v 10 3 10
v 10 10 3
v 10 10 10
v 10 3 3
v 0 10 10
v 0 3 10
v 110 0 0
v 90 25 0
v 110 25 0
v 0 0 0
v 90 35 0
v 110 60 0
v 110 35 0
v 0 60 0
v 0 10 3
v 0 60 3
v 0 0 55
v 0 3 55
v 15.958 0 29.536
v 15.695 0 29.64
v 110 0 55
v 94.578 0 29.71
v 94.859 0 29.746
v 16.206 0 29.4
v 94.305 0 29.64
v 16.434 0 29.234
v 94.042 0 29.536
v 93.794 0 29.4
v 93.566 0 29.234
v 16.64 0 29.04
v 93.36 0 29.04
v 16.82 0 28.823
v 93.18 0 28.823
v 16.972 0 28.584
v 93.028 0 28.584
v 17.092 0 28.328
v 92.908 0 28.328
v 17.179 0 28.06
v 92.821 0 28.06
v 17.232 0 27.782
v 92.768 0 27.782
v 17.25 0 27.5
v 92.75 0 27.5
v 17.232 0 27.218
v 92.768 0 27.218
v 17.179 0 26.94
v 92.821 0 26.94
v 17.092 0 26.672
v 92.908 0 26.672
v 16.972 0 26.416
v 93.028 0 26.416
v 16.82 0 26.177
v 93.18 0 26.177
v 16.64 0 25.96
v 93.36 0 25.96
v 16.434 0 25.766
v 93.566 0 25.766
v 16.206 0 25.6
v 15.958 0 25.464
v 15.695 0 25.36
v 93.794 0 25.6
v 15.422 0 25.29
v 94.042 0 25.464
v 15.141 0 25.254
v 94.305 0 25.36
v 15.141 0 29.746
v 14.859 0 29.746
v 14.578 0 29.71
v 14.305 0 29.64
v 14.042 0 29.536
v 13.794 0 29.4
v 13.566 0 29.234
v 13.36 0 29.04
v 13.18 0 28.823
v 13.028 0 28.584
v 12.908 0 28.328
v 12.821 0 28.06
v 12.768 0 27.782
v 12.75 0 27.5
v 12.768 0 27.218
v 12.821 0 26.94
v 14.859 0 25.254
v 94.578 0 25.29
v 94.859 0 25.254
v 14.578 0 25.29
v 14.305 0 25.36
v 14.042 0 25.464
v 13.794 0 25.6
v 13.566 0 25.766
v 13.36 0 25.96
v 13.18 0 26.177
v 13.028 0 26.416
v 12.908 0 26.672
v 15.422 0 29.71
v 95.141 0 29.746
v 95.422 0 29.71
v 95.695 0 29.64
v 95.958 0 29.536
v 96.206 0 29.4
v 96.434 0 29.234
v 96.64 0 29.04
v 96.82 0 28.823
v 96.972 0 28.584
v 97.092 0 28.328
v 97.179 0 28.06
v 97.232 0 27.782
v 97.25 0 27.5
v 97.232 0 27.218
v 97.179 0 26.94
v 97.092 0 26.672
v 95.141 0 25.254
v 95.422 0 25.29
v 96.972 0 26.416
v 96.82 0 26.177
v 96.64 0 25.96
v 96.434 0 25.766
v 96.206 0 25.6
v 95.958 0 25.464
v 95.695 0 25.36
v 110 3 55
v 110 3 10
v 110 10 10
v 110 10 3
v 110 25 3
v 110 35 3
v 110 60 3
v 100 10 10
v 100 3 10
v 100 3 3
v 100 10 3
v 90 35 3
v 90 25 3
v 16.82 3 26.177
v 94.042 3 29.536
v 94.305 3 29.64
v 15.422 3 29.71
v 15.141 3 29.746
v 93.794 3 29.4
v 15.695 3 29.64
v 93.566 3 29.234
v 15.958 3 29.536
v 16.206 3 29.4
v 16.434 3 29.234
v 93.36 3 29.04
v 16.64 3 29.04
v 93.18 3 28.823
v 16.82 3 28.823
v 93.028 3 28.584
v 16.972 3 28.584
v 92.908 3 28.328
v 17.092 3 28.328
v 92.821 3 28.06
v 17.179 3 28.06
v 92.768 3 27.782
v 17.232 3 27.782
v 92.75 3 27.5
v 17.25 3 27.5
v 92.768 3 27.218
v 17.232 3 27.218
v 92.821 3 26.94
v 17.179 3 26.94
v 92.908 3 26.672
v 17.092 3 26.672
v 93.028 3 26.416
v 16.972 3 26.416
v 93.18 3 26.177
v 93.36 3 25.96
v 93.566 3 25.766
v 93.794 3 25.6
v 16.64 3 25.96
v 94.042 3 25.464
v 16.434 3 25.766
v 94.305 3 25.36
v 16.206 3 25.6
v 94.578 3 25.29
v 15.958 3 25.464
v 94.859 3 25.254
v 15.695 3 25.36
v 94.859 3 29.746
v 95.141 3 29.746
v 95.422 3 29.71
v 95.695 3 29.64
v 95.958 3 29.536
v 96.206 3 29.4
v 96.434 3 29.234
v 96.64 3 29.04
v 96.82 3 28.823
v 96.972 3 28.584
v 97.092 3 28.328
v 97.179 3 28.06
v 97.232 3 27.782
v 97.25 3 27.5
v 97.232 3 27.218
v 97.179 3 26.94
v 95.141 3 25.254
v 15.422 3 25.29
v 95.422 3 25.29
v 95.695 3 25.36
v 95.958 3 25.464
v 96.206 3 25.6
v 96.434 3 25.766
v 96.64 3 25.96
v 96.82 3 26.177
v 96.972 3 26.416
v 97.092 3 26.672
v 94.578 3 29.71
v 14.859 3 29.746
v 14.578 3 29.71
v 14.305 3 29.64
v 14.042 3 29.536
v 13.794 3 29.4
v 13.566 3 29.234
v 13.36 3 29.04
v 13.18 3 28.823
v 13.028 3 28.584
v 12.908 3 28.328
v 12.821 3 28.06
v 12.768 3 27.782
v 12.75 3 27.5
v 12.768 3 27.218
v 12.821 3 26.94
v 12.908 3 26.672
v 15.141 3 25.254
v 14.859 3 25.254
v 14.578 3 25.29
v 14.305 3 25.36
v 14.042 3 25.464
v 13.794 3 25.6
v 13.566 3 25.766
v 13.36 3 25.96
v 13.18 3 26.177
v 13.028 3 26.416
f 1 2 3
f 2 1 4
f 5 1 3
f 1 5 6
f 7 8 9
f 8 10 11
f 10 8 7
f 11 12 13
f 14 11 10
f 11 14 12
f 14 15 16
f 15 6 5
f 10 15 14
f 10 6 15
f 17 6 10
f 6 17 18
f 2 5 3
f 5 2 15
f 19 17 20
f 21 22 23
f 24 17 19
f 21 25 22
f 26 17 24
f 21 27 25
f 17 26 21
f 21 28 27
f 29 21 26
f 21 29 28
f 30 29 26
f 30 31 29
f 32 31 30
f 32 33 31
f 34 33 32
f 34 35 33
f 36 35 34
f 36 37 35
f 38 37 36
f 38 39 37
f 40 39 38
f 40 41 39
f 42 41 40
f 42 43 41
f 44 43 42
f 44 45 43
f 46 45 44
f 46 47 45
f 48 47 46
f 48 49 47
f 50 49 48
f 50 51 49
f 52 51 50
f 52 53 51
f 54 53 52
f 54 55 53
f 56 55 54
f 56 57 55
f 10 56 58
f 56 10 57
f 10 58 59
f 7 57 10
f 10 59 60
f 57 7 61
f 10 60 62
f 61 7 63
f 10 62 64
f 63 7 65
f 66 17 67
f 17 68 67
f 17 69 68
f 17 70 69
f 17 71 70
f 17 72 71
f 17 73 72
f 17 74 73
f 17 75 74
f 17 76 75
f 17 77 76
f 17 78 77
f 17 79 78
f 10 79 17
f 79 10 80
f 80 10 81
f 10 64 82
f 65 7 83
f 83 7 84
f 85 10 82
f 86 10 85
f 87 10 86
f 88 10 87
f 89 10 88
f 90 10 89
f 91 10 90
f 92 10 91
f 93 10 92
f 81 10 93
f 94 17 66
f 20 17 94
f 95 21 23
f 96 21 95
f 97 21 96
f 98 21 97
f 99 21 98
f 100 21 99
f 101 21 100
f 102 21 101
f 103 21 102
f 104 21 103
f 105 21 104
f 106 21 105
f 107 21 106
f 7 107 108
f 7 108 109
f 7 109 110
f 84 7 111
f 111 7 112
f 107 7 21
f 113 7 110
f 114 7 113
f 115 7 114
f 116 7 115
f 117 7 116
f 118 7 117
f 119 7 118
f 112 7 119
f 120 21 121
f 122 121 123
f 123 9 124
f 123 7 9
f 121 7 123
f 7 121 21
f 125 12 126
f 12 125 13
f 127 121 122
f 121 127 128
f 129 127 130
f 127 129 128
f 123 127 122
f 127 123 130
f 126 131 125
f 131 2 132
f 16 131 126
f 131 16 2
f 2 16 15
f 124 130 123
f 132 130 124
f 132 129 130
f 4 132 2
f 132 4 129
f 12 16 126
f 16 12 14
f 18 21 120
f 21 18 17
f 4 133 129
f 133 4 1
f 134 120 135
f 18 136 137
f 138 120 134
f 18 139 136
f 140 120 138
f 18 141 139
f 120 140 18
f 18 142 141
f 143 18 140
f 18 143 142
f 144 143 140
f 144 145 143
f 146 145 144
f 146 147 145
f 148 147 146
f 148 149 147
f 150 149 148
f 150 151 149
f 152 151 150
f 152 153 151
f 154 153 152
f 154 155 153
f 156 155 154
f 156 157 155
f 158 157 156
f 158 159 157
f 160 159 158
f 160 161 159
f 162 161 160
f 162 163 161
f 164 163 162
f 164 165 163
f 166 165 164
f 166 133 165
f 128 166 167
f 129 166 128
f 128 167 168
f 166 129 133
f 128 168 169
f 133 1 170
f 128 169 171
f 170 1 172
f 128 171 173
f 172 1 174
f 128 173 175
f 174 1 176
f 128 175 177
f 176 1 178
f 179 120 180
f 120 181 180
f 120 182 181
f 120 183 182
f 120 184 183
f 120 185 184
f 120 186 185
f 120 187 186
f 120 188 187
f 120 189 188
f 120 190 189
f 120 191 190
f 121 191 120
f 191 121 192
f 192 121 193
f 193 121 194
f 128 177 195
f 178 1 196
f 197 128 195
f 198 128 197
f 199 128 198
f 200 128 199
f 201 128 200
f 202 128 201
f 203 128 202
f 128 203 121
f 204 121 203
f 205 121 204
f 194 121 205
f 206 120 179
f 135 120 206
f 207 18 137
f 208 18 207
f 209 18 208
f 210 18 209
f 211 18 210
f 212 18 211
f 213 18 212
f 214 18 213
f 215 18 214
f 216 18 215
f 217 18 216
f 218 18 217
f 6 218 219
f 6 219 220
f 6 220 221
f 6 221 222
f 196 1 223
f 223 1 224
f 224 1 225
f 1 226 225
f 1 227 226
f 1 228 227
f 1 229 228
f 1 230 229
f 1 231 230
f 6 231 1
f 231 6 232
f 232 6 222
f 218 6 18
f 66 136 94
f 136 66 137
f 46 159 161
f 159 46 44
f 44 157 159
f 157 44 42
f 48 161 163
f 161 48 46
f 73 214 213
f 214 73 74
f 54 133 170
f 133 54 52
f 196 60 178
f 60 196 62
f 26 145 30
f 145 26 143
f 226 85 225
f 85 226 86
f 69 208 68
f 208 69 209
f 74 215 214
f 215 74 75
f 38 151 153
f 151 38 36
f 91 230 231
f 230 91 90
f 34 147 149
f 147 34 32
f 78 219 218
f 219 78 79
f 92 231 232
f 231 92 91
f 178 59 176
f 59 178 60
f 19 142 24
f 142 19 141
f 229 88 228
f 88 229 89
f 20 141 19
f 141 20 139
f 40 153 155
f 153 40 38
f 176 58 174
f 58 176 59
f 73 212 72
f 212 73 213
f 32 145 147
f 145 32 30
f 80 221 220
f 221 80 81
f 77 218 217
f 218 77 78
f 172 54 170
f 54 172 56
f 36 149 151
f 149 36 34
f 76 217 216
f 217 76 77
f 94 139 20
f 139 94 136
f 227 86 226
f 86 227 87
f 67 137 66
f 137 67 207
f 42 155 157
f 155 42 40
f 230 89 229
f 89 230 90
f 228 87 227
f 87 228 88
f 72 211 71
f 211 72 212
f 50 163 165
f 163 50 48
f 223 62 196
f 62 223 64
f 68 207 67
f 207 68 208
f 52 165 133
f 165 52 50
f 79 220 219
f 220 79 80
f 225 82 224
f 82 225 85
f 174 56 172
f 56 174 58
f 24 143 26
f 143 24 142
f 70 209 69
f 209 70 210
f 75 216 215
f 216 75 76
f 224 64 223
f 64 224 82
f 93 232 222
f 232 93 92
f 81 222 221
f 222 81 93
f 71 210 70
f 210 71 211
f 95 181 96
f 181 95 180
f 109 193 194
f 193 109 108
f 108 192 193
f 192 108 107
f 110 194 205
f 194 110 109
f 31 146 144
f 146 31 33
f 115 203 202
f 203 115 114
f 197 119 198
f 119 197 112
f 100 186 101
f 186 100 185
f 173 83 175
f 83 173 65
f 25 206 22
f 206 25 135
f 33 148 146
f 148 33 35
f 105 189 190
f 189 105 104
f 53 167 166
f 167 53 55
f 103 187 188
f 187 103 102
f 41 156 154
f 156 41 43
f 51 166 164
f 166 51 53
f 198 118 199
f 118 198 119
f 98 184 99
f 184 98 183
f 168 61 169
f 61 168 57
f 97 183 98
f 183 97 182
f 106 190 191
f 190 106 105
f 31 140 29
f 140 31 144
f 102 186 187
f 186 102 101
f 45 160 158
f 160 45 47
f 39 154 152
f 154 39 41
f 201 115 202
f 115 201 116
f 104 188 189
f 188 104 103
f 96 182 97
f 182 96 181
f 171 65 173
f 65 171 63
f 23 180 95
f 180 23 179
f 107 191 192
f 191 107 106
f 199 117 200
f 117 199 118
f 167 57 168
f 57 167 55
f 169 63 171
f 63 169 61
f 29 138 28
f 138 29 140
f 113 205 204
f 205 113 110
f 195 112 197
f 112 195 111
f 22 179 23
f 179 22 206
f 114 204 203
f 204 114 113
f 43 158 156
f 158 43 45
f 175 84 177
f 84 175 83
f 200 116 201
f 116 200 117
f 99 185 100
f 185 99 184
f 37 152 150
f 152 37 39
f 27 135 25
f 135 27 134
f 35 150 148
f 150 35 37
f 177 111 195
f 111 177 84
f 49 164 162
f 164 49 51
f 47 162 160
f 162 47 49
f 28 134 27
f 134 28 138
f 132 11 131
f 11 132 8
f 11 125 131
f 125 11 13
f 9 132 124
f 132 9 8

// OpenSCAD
/*
 * OpenReef Peristaltic Pump L-Bracket Mount
 *
 * Parametric mounting bracket for peristaltic pumps
 * Features:
 * - L-shaped bracket for vertical pump mounting
 * - Adjustable dimensions for different pump sizes
 * - Mounting holes for pump and enclosure
 * - Cable management slot
 *
 * License: MIT
 * Based on: OpenReef project (openreef.org)
 */

// ============ PARAMETERS (Adjust these) ============

// Pump mounting holes
pump_mounting_hole_spacing = 80;   // Distance between pump mounting holes (mm)
pump_mounting_hole_diameter = 4.5; // M4 screws (mm)
pump_width = 50;                   // Width of pump body (mm)
pump_length = 100;                 // Length of pump body (mm)
pump_height = 45;                  // Height of pump (mm)

// Bracket dimensions
bracket_base_width = 60;           // Width of base plate (mm)
bracket_base_length = 110;         // Length of base plate (mm)
bracket_vertical_height = 55;      // Height of vertical plate (mm)
bracket_thickness = 3;             // Thickness of bracket material (mm)

// Enclosure mounting holes
enclosure_mounting_holes = 4;      // Number of holes to mount to enclosure
enclosure_hole_diameter = 3.5;     // M3 screws (mm)
enclosure_hole_spacing_x = 50;     // Spacing between holes horizontally (mm)
enclosure_hole_spacing_y = 100;    // Spacing between holes vertically (mm)

// Cable management
cable_slot_width = 10;             // Width of cable slot (mm)
cable_slot_height = 5;             // Height of cable slot (mm)

// Reinforcement
add_gusset = true;                 // Add triangular gusset for strength
gusset_height = 30;                // Height of gusset triangle (mm)

// Print settings
$fn = 50;                          // Resolution

// ============ CALCULATIONS ============

total_width = max(bracket_base_width, pump_width + 10);
total_length = max(bracket_base_length, pump_length + 10);

// ============ MAIN MODEL ============

module pump_mount_bracket() {
    difference() {
        union() {
            // Base plate (horizontal)
            cube([total_length, total_width, bracket_thickness]);

            // Vertical plate
            translate([0, 0, 0])
                cube([total_length, bracket_thickness, bracket_vertical_height]);

            // Gusset reinforcement
            if (add_gusset) {
                translate([total_length/2 - gusset_height/2, bracket_thickness, 0])
                    rotate([90, 0, 0])
                        linear_extrude(height=bracket_thickness)
                            polygon(points=[
                                [0, 0],
                                [gusset_height, 0],
                                [gusset_height/2, gusset_height]
                            ]);
            }

            // Corner reinforcement blocks
            for (x = [0, total_length - 10]) {
                translate([x, 0, 0])
                    cube([10, 10, 10]);
            }
        }

        // Pump mounting holes (vertical plate)
        pump_hole_offset_z = bracket_vertical_height / 2;
        pump_hole_offset_x1 = (total_length - pump_mounting_hole_spacing) / 2;
        pump_hole_offset_x2 = pump_hole_offset_x1 + pump_mounting_hole_spacing;

        translate([pump_hole_offset_x1, -1, pump_hole_offset_z])
            rotate([-90, 0, 0])
                cylinder(h=bracket_thickness + 2, d=pump_mounting_hole_diameter);

        translate([pump_hole_offset_x2, -1, pump_hole_offset_z])
            rotate([-90, 0, 0])
                cylinder(h=bracket_thickness + 2, d=pump_mounting_hole_diameter);

        // Countersink for pump mounting holes (optional)
        translate([pump_hole_offset_x1, bracket_thickness, pump_hole_offset_z])
            rotate([-90, 0, 0])
                cylinder(h=2, d1=pump_mounting_hole_diameter, d2=pump_mounting_hole_diameter + 2);

        translate([pump_hole_offset_x2, bracket_thickness, pump_hole_offset_z])
            rotate([-90, 0, 0])
                cylinder(h=2, d1=pump_mounting_hole_diameter, d2=pump_mounting_hole_diameter + 2);

        // Enclosure mounting holes (base plate)
        enclosure_hole_x1 = (total_length - enclosure_hole_spacing_x) / 2;
        enclosure_hole_x2 = enclosure_hole_x1 + enclosure_hole_spacing_x;
        enclosure_hole_y1 = (total_width - enclosure_hole_spacing_y) / 2;
        enclosure_hole_y2 = enclosure_hole_y1 + enclosure_hole_spacing_y;

        for (x = [enclosure_hole_x1, enclosure_hole_x2]) {
            for (y = [enclosure_hole_y1, enclosure_hole_y2]) {
                translate([x, y, -1])
                    cylinder(h=bracket_thickness + 2, d=enclosure_hole_diameter);

                // Countersink for flush mounting
                translate([x, y, bracket_thickness - 1.5])
                    cylinder(h=2, d1=enclosure_hole_diameter, d2=enclosure_hole_diameter + 3);
            }
        }

        // Cable management slot
        translate([total_length - 20, total_width/2 - cable_slot_width/2, bracket_thickness - cable_slot_height])
            cube([20, cable_slot_width, cable_slot_height + 1]);

        // Cable pass-through hole
        translate([total_length - 10, total_width/2, -1])
            cylinder(h=bracket_thickness + 2, d=8);
    }
}

// ============ RENDER ============

pump_mount_bracket();

// ============ PRINT INSTRUCTIONS ============

/*
 * PRINTING TIPS:
 *
 * 1. Orientation: Print with base plate flat on bed
 * 2. Layer height: 0.2mm
 * 3. Infill: 40% (needs strength)
 * 4. Supports: None needed with this orientation
 * 5. Material: PETG (strong, heat resistant) or PLA
 * 6. Perimeters: 4 perimeters for extra strength
 * 7. First layer: Critical - ensure good adhesion
 *
 * ASSEMBLY:
 *
 * 1. Mount bracket to enclosure using 4× M3 screws
 * 2. Verify bracket is level and secure
 * 3. Mount pump to bracket using 2× M4 screws
 * 4. Route cables through cable slot and pass-through hole
 * 5. Connect pump to motor driver
 *
 * CUSTOMIZATION:
 *
 * For different pump sizes:
 * - Measure pump mounting hole spacing with calipers
 * - Measure pump body dimensions
 * - Adjust parameters at top of file
 * - Ensure holes align before printing full size
 * - Consider printing small test piece first
 *
 * MATERIALS:
 *
 * Alternative to 3D printing:
 * - Laser cut from 3mm acrylic or plywood
 * - Bend aluminum sheet (1.5-2mm thickness)
 * - Export top view and side view as DXF
 *
 * HARDWARE REQUIRED:
 *
 * - 4× M3 × 10mm screws (enclosure mounting)
 * - 4× M3 nuts or threaded inserts
 * - 2× M4 × 16mm screws (pump mounting)
 * - 2× M4 nuts or threaded inserts
 * - Cable ties for cable management
 */
